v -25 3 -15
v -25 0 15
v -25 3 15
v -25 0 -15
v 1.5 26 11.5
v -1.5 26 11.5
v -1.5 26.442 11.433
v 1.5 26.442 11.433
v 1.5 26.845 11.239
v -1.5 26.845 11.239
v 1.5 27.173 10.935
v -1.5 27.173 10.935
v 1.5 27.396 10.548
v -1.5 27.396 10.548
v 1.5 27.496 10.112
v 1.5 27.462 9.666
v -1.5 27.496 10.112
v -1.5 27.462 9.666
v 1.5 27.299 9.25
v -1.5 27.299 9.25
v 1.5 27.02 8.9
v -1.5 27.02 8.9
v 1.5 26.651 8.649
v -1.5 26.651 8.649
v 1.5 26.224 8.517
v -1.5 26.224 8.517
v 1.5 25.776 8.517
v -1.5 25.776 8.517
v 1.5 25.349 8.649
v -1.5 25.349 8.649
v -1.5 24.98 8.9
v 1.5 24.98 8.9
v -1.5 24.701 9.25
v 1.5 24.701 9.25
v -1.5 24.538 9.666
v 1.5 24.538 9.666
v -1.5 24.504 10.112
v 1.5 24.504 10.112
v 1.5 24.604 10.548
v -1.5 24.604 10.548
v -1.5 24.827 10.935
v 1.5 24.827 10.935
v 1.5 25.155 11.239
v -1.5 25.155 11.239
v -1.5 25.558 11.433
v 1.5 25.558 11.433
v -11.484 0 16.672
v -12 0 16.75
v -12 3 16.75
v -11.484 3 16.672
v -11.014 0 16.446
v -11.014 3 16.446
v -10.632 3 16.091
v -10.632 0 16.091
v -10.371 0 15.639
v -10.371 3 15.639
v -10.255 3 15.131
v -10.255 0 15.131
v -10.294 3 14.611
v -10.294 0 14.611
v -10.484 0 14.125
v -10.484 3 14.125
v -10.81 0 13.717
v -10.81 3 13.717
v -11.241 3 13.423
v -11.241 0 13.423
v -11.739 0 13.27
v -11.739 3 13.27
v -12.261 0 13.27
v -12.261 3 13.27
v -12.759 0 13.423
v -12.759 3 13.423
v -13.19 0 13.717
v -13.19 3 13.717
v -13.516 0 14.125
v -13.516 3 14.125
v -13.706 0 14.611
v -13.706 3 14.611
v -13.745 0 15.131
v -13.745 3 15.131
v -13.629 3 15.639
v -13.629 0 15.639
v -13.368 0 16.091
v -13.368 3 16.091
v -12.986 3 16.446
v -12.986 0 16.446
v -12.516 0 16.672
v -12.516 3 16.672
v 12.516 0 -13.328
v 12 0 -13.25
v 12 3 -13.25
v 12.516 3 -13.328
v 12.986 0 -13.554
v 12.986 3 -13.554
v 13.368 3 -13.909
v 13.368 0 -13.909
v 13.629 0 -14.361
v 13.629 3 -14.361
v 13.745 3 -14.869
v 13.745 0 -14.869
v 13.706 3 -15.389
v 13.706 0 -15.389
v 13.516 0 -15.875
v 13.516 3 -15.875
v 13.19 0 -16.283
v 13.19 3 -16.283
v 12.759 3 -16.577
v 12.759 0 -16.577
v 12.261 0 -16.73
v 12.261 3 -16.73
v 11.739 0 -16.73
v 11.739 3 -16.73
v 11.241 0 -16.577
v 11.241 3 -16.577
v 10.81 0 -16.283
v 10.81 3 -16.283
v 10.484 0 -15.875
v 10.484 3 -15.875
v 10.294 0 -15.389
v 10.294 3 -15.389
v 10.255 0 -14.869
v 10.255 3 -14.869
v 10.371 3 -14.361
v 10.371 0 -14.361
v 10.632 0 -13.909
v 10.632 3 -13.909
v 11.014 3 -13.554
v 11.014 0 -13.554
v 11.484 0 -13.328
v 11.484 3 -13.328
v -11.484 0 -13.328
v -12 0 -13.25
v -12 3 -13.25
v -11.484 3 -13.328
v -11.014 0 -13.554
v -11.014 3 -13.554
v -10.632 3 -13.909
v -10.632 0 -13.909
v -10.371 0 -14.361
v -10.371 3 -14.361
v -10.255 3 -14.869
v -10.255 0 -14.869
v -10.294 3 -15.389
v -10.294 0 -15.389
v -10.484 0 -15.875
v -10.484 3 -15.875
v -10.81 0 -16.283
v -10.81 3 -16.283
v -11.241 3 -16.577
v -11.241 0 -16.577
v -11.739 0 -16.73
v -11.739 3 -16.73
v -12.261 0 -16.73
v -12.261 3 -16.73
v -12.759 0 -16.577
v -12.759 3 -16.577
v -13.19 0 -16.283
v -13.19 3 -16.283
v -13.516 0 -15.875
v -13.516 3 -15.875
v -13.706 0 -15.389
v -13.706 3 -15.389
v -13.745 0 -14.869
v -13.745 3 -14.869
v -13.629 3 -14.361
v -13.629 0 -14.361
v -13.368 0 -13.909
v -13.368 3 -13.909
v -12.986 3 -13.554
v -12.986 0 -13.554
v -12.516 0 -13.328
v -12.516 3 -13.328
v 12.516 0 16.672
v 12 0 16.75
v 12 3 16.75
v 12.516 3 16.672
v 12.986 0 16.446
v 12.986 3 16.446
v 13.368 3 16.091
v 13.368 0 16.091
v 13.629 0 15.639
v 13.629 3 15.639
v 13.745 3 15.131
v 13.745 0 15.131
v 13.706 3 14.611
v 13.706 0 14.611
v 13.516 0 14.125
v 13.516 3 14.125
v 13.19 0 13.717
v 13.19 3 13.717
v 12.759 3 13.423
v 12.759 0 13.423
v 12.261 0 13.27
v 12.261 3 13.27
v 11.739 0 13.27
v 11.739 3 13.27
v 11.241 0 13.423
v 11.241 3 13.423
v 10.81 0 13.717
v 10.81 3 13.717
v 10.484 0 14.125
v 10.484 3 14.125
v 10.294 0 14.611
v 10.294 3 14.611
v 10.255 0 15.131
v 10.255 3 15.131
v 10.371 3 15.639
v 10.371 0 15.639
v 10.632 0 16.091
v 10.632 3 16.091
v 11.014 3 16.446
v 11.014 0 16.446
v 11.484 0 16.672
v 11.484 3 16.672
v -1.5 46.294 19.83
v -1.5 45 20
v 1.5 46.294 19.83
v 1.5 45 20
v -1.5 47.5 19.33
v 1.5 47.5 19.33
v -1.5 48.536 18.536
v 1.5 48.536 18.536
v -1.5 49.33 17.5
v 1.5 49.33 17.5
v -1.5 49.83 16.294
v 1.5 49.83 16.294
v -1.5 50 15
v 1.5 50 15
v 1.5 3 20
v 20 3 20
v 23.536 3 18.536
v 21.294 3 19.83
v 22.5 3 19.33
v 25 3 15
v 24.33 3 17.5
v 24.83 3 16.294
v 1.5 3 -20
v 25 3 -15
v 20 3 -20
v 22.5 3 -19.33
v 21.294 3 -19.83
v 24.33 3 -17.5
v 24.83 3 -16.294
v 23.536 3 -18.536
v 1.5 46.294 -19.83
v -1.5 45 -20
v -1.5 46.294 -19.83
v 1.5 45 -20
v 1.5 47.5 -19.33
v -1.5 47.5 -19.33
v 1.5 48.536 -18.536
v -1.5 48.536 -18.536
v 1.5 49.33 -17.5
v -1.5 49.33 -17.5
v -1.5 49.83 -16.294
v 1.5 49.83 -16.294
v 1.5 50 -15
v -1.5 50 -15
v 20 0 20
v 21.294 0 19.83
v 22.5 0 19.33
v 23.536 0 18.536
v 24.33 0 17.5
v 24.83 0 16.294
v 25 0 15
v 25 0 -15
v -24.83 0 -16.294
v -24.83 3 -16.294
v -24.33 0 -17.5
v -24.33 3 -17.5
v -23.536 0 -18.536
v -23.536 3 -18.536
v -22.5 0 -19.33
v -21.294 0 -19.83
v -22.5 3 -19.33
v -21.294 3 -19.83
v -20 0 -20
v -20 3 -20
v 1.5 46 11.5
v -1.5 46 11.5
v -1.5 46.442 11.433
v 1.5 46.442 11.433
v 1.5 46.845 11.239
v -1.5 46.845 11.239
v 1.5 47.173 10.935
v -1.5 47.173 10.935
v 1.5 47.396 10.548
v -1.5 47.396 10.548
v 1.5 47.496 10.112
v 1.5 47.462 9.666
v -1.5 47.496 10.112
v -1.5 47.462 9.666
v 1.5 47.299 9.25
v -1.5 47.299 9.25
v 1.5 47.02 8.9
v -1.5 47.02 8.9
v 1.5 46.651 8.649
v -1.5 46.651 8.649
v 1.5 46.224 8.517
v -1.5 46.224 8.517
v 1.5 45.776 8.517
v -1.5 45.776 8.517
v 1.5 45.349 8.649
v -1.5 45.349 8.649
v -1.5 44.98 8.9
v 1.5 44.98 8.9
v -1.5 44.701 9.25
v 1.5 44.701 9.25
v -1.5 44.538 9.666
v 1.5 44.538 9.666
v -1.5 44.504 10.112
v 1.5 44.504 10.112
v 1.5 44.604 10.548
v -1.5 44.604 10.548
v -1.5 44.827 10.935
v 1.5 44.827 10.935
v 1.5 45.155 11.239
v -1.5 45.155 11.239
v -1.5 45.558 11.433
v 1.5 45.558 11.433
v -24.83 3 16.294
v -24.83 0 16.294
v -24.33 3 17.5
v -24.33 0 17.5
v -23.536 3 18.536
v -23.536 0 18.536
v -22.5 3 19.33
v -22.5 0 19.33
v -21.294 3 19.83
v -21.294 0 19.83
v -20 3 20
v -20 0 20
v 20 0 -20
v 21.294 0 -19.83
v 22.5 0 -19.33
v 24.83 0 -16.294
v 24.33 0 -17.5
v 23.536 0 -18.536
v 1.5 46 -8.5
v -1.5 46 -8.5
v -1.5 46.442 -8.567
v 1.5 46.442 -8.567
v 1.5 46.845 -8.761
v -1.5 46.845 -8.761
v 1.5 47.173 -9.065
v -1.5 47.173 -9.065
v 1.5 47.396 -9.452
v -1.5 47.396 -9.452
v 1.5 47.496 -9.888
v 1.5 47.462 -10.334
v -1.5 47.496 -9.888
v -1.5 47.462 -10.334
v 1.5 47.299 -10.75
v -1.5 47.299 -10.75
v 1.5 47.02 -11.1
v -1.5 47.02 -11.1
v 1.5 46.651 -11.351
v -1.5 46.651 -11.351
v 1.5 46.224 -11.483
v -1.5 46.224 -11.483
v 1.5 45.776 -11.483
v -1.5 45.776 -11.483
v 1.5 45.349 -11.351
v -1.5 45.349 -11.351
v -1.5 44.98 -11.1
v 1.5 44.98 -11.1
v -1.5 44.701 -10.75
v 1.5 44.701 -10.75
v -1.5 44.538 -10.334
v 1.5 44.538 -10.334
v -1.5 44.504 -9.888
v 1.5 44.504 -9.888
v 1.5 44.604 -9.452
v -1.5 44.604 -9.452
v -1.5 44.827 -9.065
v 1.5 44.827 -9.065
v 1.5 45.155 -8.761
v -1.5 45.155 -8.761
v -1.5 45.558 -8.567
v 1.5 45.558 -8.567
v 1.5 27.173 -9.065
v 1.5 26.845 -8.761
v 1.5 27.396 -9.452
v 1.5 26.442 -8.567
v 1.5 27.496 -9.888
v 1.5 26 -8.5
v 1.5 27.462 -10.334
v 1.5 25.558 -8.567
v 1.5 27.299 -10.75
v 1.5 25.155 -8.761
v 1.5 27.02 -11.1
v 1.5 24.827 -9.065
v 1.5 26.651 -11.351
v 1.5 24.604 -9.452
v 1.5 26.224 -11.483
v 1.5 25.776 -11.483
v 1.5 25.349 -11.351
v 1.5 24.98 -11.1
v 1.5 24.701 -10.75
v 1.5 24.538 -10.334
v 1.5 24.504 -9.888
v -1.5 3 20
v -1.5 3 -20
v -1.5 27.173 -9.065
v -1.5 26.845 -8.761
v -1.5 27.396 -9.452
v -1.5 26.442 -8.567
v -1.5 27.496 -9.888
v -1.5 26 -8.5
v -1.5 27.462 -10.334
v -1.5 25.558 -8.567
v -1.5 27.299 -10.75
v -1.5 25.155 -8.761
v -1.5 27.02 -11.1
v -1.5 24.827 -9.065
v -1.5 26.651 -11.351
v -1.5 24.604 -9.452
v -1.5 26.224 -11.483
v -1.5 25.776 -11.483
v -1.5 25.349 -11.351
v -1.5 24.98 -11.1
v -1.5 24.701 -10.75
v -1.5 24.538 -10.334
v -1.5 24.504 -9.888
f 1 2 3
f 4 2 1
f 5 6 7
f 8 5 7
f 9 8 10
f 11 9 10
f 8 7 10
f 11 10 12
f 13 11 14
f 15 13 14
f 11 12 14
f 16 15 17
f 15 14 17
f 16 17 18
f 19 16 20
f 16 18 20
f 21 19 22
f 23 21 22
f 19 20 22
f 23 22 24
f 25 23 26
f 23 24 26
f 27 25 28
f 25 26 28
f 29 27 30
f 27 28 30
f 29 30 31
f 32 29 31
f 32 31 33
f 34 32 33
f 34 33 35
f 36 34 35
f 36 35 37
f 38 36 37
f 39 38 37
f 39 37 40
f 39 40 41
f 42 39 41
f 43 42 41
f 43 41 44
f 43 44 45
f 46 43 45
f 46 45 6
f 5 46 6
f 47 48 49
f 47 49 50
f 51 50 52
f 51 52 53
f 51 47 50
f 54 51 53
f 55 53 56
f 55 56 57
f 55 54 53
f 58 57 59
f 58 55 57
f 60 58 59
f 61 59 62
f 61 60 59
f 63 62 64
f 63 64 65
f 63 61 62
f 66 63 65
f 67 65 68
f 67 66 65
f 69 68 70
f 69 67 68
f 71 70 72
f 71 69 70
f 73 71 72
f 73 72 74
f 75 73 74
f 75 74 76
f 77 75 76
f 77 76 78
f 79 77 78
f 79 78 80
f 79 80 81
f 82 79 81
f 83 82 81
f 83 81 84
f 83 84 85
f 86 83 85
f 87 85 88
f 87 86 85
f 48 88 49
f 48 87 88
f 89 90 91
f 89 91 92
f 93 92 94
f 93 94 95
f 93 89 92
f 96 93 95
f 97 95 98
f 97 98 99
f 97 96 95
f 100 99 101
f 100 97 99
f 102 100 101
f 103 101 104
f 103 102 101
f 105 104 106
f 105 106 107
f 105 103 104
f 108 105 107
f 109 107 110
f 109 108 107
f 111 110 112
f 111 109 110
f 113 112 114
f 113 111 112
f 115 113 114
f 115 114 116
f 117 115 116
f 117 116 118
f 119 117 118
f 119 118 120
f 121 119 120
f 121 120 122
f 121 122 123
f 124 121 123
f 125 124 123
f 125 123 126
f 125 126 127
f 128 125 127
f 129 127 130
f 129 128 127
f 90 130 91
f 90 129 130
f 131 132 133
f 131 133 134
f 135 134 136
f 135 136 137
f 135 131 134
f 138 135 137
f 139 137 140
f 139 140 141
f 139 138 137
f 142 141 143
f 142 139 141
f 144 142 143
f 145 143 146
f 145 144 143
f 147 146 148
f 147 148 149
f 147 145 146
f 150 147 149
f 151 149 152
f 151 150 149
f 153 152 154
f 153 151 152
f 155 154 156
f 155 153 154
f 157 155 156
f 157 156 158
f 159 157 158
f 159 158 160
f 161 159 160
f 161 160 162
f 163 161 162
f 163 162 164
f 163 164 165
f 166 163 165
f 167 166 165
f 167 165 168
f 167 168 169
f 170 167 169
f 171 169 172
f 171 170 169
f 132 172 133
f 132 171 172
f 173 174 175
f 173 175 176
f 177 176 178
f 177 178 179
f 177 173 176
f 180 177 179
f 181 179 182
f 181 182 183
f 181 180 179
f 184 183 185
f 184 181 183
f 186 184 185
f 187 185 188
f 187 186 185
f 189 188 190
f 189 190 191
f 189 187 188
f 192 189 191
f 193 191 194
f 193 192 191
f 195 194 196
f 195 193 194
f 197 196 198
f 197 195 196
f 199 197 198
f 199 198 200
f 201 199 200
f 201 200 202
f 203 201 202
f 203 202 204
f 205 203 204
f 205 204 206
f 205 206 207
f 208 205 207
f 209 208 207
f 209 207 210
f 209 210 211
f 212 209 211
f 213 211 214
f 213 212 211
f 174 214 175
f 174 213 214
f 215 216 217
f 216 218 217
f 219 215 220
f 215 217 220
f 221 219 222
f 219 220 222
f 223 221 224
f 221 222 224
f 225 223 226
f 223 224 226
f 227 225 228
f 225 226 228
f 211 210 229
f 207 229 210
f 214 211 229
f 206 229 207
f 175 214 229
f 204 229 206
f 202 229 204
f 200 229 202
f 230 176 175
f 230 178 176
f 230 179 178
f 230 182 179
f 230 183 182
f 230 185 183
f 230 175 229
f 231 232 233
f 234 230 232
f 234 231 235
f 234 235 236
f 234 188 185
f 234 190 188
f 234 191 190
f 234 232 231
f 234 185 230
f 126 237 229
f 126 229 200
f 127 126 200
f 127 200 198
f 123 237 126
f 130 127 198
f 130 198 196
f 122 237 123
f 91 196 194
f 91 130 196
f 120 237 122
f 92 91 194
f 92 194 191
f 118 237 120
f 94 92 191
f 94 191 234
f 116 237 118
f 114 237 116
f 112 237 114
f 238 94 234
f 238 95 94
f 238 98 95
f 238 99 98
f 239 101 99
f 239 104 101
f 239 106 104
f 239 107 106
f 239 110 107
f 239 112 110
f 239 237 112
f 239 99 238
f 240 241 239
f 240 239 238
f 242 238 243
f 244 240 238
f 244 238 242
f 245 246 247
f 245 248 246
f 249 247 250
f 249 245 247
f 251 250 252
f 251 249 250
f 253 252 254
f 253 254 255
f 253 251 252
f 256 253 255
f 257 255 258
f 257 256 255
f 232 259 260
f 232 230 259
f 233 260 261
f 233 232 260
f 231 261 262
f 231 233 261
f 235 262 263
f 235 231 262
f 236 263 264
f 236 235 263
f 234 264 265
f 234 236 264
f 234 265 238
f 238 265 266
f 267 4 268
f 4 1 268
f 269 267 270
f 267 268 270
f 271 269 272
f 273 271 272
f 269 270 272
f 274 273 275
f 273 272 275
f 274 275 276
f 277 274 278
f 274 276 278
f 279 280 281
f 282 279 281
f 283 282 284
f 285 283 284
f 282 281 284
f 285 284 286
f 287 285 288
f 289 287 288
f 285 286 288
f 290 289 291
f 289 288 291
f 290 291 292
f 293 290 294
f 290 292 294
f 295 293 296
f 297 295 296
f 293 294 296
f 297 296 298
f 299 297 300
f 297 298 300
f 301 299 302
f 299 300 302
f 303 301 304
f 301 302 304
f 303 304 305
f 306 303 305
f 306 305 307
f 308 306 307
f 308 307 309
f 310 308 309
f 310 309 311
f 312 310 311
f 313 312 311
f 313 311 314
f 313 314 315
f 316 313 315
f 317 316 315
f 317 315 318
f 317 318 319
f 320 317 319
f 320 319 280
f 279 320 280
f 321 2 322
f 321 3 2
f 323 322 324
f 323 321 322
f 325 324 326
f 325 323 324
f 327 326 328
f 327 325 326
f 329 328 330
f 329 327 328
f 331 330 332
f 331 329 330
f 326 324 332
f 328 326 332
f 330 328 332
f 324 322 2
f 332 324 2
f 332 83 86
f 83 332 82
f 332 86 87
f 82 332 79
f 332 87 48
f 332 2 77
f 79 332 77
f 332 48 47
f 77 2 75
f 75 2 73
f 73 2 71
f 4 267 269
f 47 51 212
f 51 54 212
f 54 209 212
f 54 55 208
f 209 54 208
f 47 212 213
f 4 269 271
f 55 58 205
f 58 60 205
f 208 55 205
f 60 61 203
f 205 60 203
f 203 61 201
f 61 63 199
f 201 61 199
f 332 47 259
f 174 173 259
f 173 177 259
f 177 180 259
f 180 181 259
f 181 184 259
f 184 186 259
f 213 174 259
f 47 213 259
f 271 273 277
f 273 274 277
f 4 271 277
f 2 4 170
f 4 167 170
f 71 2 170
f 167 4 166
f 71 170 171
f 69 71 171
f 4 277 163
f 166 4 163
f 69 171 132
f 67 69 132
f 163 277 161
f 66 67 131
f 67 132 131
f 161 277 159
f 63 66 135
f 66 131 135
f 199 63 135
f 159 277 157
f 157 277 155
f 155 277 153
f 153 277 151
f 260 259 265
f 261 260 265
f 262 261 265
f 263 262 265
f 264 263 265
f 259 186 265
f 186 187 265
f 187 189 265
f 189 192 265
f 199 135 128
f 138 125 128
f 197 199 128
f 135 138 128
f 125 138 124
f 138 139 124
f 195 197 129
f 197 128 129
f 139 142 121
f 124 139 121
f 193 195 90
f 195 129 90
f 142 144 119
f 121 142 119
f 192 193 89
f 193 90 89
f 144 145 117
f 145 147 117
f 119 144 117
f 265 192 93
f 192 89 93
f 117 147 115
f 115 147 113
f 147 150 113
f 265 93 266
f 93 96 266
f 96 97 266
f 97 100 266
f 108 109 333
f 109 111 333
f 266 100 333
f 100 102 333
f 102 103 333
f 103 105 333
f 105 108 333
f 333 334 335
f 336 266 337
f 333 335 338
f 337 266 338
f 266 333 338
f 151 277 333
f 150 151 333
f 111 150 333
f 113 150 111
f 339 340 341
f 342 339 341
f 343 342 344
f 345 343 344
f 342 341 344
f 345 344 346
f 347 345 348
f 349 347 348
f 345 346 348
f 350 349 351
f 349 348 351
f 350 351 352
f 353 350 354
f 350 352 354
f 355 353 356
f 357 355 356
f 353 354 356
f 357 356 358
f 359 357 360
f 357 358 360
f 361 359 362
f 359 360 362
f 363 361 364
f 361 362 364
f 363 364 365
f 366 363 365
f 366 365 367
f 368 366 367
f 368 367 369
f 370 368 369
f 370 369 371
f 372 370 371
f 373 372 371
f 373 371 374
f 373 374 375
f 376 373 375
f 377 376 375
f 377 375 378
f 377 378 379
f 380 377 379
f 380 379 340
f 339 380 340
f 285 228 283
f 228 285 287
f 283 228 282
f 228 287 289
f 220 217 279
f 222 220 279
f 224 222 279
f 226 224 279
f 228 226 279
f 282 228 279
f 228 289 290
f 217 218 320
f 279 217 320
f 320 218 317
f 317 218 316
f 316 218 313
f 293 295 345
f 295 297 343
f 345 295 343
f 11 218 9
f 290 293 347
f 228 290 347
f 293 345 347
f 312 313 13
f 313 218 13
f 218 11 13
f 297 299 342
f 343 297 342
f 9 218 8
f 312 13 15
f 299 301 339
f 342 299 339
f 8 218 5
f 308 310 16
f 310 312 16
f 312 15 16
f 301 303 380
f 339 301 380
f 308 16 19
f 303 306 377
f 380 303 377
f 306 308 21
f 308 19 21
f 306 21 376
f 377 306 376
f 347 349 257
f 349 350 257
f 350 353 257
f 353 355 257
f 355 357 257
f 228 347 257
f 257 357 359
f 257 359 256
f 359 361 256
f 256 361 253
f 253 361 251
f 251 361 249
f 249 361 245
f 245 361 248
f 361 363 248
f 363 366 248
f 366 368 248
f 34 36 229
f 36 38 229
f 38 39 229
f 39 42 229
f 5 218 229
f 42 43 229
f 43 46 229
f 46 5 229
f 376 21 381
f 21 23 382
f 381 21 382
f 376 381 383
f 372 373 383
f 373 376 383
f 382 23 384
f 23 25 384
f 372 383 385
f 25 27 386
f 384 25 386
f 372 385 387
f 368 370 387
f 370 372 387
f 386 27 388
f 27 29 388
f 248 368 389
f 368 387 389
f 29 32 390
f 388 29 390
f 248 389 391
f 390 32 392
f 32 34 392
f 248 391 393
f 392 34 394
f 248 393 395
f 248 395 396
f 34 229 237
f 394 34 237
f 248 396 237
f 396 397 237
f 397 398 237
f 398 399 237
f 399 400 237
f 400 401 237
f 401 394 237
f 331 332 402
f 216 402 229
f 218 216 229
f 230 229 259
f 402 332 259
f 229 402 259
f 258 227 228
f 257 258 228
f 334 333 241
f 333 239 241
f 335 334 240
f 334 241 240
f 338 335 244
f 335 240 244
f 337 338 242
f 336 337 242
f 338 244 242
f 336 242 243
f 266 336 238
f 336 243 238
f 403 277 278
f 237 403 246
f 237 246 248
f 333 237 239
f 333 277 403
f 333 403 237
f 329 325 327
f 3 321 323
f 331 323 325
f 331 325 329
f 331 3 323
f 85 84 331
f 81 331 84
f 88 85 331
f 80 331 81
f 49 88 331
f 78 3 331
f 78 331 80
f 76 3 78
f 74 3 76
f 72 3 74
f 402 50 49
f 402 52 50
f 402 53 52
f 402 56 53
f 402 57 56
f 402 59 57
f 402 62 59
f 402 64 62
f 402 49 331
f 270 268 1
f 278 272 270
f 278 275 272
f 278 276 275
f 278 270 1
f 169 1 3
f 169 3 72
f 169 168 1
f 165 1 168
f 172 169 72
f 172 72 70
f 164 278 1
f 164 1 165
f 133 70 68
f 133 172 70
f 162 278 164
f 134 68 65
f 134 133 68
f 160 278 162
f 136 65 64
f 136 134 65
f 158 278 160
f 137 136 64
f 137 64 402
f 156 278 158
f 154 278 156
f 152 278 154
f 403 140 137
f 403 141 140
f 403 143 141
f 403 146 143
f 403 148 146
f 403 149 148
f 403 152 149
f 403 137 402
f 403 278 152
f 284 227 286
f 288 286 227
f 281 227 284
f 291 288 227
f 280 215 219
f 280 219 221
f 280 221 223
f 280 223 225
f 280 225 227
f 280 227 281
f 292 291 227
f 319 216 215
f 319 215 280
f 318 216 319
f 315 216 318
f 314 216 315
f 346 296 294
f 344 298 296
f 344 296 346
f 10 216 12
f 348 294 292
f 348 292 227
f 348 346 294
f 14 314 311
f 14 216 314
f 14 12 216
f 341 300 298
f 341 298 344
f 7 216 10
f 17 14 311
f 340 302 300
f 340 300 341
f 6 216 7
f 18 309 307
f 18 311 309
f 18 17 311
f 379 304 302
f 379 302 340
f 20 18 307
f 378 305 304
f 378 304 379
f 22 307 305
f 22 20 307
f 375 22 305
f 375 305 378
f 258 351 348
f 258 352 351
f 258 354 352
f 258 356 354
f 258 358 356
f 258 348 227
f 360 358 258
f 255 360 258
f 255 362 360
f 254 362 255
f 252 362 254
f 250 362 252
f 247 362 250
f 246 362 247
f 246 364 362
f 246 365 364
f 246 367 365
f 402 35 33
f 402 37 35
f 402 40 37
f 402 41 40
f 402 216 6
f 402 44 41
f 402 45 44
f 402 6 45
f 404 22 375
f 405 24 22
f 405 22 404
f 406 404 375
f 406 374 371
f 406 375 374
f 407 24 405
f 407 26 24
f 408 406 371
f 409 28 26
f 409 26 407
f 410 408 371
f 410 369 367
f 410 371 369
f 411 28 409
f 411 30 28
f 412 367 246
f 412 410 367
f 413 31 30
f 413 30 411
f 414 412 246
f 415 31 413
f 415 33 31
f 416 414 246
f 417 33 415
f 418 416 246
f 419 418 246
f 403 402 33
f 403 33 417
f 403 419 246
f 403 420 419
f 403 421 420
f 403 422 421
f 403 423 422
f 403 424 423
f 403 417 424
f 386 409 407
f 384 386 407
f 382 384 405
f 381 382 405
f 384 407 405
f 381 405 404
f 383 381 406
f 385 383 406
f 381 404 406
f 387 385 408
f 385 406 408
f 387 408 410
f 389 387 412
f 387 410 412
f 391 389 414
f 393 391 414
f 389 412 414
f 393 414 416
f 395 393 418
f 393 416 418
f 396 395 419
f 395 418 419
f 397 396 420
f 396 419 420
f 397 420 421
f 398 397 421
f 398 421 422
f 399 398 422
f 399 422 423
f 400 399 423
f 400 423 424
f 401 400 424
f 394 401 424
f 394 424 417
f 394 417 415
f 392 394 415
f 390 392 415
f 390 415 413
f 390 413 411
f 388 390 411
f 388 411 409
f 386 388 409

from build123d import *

# Parameters (mm, degrees)
SKETCH_1_W          = 50
SKETCH_1_H          = 40
SKETCH_1_R          = 1.75
EXTRUDE_1_DEPTH     = 3
FILLET_1_R          = 5
SKETCH_2_W          = 3
SKETCH_2_H          = 40
EXTRUDE_2_DEPTH     = 47
CUT_EXTRUDE_1_REACH = 62.019
SKETCH_3_R          = 1.5
FILLET_2_R          = 5


with BuildPart() as part:
    # 草图1 → 凸台-拉伸1 (new body)
    with BuildSketch(Plane(origin=(0, 0, 0), x_dir=(1, 0, 0), z_dir=(0, 1, 0))):
        Rectangle(SKETCH_1_W, SKETCH_1_H)
        with Locations(Location((-12, 15, 0), (0, 0, 270))):
            Circle(SKETCH_1_R, mode=Mode.SUBTRACT)
        with Locations(Location((12, 15, 0), (0, 0, 270))):
            Circle(SKETCH_1_R, mode=Mode.SUBTRACT)
        with Locations(Location((12, -15, 0), (0, 0, 270))):
            Circle(SKETCH_1_R, mode=Mode.SUBTRACT)
        with Locations(Location((-12, -15, 0), (0, 0, 270))):
            Circle(SKETCH_1_R, mode=Mode.SUBTRACT)
    extrude(amount=EXTRUDE_1_DEPTH)

    # 圆角1
    fillet_1_edges = [part.edges().sort_by_distance(p)[0] for p in [
        (25, 1.5, 20),
        (-25, 1.5, 20),
        (-25, 1.5, -20),
        (25, 1.5, -20),
    ]]
    fillet(fillet_1_edges, radius=FILLET_1_R)

    # 草图2 → 凸台-拉伸2 (add)
    with BuildSketch(Plane(origin=(0, 3, 0), x_dir=(1, 0, 0), z_dir=(0, 1, 0))):
        Rectangle(SKETCH_2_W, SKETCH_2_H)
    extrude(amount=EXTRUDE_2_DEPTH)

    # 草图3 → 切除-拉伸1 (cut, up to next)
    with BuildSketch(Plane.ZY.offset(1.5), mode=Mode.PRIVATE) as cut_extrude_1_sk1:
        with Locations((-10, 46)):
            Circle(SKETCH_3_R)
    cut_extrude_1_tool1 = extrude(cut_extrude_1_sk1.sketch, amount=-CUT_EXTRUDE_1_REACH, mode=Mode.PRIVATE) & part.part
    # 草图3 → 切除-拉伸1 (cut, up to next)
    with BuildSketch(Plane.ZY.offset(1.5), mode=Mode.PRIVATE) as cut_extrude_1_sk2:
        with Locations((10, 46)):
            Circle(SKETCH_3_R)
    cut_extrude_1_tool2 = extrude(cut_extrude_1_sk2.sketch, amount=-CUT_EXTRUDE_1_REACH, mode=Mode.PRIVATE) & part.part
    # 草图3 → 切除-拉伸1 (cut, up to next)
    with BuildSketch(Plane.ZY.offset(1.5), mode=Mode.PRIVATE) as cut_extrude_1_sk3:
        with Locations((10, 26)):
            Circle(SKETCH_3_R)
    cut_extrude_1_tool3 = extrude(cut_extrude_1_sk3.sketch, amount=-CUT_EXTRUDE_1_REACH, mode=Mode.PRIVATE) & part.part
    # 草图3 → 切除-拉伸1 (cut, up to next)
    with BuildSketch(Plane.ZY.offset(1.5), mode=Mode.PRIVATE) as cut_extrude_1_sk4:
        with Locations((-10, 26)):
            Circle(SKETCH_3_R)
    cut_extrude_1_tool4 = extrude(cut_extrude_1_sk4.sketch, amount=-CUT_EXTRUDE_1_REACH, mode=Mode.PRIVATE) & part.part
    add(cut_extrude_1_tool1.solids().sort_by_distance((-1.5, 46, -10))[0], mode=Mode.SUBTRACT)
    add(cut_extrude_1_tool2.solids().sort_by_distance((-1.5, 46, 10))[0], mode=Mode.SUBTRACT)
    add(cut_extrude_1_tool3.solids().sort_by_distance((-1.5, 26, 10))[0], mode=Mode.SUBTRACT)
    add(cut_extrude_1_tool4.solids().sort_by_distance((-1.5, 26, -10))[0], mode=Mode.SUBTRACT)

    # 圆角2
    fillet_2_edges = [part.edges().sort_by_distance(p)[0] for p in [
        (0, 50, -20),
        (0, 50, 20),
    ]]
    fillet(fillet_2_edges, radius=FILLET_2_R)


solid = part.part
